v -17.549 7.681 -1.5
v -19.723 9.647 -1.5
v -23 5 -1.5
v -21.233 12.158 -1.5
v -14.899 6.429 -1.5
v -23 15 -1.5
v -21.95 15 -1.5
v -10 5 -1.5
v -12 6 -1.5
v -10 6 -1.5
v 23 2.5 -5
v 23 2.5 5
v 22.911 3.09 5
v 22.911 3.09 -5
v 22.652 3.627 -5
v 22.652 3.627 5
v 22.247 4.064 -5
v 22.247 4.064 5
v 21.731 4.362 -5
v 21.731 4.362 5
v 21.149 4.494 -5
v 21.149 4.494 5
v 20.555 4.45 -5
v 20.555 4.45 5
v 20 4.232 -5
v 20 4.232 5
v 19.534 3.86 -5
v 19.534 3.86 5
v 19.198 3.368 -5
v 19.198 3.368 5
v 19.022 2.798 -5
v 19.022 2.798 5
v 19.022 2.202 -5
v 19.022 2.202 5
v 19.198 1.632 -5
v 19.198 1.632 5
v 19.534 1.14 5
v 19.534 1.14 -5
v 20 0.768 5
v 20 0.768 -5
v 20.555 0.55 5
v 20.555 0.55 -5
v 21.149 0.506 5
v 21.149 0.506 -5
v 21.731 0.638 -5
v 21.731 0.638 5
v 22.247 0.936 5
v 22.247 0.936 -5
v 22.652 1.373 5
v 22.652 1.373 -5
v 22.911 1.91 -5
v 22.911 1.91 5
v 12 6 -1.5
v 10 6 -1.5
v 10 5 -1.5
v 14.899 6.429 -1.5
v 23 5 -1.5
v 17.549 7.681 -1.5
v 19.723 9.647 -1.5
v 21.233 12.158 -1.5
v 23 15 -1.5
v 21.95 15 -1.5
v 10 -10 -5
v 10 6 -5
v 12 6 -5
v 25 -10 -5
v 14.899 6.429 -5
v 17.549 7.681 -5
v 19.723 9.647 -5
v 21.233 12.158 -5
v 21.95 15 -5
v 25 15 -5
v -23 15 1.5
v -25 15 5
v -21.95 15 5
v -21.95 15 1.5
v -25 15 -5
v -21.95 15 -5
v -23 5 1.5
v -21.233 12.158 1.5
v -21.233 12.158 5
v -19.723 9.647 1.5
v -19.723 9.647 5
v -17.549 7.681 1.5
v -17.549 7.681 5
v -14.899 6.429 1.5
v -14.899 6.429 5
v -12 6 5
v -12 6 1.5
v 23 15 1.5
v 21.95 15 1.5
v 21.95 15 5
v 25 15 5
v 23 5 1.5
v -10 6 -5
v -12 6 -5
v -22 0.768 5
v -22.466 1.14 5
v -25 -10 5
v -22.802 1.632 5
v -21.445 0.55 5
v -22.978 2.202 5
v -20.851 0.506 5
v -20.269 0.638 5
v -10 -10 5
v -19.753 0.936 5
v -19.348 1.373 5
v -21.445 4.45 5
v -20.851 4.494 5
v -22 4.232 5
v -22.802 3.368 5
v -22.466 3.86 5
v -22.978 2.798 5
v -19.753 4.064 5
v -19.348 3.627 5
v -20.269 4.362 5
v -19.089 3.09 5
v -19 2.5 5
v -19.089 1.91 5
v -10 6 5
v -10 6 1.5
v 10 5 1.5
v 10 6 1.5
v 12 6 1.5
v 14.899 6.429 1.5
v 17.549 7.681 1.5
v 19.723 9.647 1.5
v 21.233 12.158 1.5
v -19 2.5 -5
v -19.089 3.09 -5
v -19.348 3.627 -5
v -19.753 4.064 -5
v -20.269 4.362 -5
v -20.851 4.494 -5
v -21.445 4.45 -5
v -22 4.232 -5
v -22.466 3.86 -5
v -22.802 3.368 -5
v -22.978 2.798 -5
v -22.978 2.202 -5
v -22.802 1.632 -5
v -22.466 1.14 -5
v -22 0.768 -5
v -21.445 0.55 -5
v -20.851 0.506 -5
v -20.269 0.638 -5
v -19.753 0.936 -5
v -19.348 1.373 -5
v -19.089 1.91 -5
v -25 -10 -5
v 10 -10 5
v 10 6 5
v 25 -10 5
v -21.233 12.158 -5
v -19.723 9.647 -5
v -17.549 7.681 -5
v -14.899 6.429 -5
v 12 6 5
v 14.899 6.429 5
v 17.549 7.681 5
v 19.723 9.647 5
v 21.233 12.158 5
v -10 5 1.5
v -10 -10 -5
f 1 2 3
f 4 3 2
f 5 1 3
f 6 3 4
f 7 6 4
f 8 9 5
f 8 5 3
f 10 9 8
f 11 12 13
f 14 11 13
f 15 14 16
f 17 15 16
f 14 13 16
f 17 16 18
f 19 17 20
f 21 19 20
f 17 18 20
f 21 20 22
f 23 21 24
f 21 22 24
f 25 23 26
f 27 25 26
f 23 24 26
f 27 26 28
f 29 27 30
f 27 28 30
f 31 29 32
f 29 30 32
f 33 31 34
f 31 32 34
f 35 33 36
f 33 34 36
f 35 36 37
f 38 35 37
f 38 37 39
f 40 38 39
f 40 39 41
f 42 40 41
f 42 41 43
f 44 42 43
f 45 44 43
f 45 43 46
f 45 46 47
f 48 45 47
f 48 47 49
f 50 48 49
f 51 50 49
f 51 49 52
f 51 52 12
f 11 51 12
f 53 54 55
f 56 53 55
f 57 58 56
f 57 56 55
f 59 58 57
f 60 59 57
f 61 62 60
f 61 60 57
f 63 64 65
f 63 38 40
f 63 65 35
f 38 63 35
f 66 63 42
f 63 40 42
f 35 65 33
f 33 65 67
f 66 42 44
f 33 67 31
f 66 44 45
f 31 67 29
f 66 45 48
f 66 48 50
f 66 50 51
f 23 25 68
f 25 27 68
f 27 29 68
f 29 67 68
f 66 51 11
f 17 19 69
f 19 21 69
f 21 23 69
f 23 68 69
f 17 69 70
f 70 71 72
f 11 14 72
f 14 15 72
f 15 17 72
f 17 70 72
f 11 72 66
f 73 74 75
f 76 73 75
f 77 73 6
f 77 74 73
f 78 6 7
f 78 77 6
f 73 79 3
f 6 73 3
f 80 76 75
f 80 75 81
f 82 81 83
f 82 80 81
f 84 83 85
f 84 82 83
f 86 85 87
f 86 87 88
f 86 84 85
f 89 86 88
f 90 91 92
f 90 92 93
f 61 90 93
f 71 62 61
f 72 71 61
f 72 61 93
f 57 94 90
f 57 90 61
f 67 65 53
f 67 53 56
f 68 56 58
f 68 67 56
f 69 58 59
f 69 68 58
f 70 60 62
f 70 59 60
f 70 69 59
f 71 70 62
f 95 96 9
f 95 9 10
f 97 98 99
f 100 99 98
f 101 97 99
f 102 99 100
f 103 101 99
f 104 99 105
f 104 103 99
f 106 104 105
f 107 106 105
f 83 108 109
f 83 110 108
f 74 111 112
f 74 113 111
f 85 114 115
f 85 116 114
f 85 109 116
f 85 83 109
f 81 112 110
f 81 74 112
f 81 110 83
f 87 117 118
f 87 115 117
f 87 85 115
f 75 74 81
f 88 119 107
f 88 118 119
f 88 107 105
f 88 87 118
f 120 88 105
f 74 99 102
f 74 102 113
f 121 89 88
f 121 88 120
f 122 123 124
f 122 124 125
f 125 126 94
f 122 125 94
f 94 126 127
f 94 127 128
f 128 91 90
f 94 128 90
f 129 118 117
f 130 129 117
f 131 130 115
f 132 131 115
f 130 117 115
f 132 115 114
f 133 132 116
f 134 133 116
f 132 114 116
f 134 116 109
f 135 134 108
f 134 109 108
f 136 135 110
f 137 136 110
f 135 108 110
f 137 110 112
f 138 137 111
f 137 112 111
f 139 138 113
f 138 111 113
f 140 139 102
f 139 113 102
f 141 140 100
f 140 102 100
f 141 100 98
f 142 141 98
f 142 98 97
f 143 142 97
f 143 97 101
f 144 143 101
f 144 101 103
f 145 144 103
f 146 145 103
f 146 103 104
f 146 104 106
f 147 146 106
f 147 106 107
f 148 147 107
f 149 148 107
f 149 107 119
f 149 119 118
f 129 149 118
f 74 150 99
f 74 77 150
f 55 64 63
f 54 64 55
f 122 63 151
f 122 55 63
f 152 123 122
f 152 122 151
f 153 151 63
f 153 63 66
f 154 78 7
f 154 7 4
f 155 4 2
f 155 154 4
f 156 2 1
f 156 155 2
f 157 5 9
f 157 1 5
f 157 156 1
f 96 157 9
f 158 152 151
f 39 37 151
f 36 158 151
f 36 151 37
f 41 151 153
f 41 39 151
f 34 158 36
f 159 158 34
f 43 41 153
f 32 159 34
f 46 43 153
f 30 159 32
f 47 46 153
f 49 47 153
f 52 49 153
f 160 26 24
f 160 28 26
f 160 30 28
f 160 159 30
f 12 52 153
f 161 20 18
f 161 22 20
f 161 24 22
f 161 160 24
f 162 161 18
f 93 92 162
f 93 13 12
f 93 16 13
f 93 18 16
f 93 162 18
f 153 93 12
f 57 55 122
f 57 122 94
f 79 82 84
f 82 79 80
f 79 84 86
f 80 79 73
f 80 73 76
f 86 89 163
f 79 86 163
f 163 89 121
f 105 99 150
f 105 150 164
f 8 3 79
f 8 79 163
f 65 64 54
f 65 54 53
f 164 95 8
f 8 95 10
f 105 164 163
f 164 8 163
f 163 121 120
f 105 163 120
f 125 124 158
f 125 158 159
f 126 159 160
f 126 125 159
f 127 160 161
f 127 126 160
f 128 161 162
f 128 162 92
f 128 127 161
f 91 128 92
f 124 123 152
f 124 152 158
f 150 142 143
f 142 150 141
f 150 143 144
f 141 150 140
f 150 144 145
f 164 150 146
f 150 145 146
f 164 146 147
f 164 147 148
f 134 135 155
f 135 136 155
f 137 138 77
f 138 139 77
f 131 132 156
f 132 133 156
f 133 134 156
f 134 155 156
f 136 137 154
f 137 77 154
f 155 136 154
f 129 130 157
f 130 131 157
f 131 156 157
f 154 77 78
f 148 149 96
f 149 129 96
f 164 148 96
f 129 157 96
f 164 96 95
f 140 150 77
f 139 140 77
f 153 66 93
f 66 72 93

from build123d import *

# Parameters (mm, degrees)
SKETCH1_W           = 50
SKETCH1_H           = 10
BOSS_EXTRUDE1_DEPTH = 15
SKETCH3_W           = 46
SKETCH3_H           = 3
CUT_EXTRUDE1_DEPTH  = 10
CUT_EXTRUDE2_DEPTH  = 10
SKETCH5_W           = 15
SKETCH5_H           = 10
BOSS_EXTRUDE2_DEPTH = 10
SKETCH6_R           = 2
CUT_EXTRUDE3_DEPTH  = 31.822070015


with BuildPart() as part:
    # Sketch1 → Boss-Extrude1 (new body)
    with BuildSketch(Plane(origin=(0, 0, 0), x_dir=(1, 0, 0), z_dir=(0, 1, 0))):
        Rectangle(SKETCH1_W, SKETCH1_H)
    extrude(amount=BOSS_EXTRUDE1_DEPTH)

    # Sketch3 → Cut-Extrude1 (cut)
    with BuildSketch(Plane(origin=(0, 15, 0), x_dir=(1, 0, 0), z_dir=(0, 1, 0))):
        Rectangle(SKETCH3_W, SKETCH3_H)
    extrude(amount=-CUT_EXTRUDE1_DEPTH, mode=Mode.SUBTRACT)

    # Sketch4 → Cut-Extrude2 (cut)
    with BuildSketch(Plane.XY.offset(5)):
        with BuildLine():
            Line((-10, 6), (-10, 0))
            Line((-10, 0), (10, 0))
            Line((10, 0), (10, 6))
            Line((10, 6), (12, 6))
            ThreePointArc((12, 6), (18.708203932, 8.583801513), (21.949874371, 15))
            Line((21.949874371, 15), (-21.949874371, 15))
            ThreePointArc((-21.949874371, 15), (-18.708203932, 8.583801513), (-12, 6))
            Line((-12, 6), (-10, 6))
        make_face()
    extrude(amount=-CUT_EXTRUDE2_DEPTH, mode=Mode.SUBTRACT)


with BuildPart() as cut_extrude2_piece_1:
    # of the separate pieces the step leaves, piece 1, a body of its own (cut_extrude2_pieces)
    add(part.part.solids().sort_by_distance((-25, 0, 5))[0])



with BuildPart() as cut_extrude2_piece_2:
    # of the separate pieces the step leaves, piece 2, a body of its own (cut_extrude2_pieces)
    add(part.part.solids().sort_by_distance((10, 0, 5))[0])


with BuildPart() as cut_extrude2_piece_1_1:
    add(cut_extrude2_piece_1.part)

    add(cut_extrude2_piece_2.part)  # Boss-Extrude2 merges Cut-Extrude2 piece 2
    # Sketch5 → Boss-Extrude2 (add)
    with BuildSketch(Plane.XZ):
        with Locations((-17.5, 0)):
            Rectangle(SKETCH5_W, SKETCH5_H)
        with Locations((17.5, 0)):
            Rectangle(SKETCH5_W, SKETCH5_H)
    extrude(amount=BOSS_EXTRUDE2_DEPTH)

    # Sketch6 → Cut-Extrude3 (cut, through all)
    with BuildSketch(Plane.XY.offset(5)):
        with Locations((-21, 2.5)):
            Circle(SKETCH6_R)
        with Locations((21, 2.5)):
            Circle(SKETCH6_R)
    extrude(amount=-CUT_EXTRUDE3_DEPTH, mode=Mode.SUBTRACT)


solid = cut_extrude2_piece_1_1.part
